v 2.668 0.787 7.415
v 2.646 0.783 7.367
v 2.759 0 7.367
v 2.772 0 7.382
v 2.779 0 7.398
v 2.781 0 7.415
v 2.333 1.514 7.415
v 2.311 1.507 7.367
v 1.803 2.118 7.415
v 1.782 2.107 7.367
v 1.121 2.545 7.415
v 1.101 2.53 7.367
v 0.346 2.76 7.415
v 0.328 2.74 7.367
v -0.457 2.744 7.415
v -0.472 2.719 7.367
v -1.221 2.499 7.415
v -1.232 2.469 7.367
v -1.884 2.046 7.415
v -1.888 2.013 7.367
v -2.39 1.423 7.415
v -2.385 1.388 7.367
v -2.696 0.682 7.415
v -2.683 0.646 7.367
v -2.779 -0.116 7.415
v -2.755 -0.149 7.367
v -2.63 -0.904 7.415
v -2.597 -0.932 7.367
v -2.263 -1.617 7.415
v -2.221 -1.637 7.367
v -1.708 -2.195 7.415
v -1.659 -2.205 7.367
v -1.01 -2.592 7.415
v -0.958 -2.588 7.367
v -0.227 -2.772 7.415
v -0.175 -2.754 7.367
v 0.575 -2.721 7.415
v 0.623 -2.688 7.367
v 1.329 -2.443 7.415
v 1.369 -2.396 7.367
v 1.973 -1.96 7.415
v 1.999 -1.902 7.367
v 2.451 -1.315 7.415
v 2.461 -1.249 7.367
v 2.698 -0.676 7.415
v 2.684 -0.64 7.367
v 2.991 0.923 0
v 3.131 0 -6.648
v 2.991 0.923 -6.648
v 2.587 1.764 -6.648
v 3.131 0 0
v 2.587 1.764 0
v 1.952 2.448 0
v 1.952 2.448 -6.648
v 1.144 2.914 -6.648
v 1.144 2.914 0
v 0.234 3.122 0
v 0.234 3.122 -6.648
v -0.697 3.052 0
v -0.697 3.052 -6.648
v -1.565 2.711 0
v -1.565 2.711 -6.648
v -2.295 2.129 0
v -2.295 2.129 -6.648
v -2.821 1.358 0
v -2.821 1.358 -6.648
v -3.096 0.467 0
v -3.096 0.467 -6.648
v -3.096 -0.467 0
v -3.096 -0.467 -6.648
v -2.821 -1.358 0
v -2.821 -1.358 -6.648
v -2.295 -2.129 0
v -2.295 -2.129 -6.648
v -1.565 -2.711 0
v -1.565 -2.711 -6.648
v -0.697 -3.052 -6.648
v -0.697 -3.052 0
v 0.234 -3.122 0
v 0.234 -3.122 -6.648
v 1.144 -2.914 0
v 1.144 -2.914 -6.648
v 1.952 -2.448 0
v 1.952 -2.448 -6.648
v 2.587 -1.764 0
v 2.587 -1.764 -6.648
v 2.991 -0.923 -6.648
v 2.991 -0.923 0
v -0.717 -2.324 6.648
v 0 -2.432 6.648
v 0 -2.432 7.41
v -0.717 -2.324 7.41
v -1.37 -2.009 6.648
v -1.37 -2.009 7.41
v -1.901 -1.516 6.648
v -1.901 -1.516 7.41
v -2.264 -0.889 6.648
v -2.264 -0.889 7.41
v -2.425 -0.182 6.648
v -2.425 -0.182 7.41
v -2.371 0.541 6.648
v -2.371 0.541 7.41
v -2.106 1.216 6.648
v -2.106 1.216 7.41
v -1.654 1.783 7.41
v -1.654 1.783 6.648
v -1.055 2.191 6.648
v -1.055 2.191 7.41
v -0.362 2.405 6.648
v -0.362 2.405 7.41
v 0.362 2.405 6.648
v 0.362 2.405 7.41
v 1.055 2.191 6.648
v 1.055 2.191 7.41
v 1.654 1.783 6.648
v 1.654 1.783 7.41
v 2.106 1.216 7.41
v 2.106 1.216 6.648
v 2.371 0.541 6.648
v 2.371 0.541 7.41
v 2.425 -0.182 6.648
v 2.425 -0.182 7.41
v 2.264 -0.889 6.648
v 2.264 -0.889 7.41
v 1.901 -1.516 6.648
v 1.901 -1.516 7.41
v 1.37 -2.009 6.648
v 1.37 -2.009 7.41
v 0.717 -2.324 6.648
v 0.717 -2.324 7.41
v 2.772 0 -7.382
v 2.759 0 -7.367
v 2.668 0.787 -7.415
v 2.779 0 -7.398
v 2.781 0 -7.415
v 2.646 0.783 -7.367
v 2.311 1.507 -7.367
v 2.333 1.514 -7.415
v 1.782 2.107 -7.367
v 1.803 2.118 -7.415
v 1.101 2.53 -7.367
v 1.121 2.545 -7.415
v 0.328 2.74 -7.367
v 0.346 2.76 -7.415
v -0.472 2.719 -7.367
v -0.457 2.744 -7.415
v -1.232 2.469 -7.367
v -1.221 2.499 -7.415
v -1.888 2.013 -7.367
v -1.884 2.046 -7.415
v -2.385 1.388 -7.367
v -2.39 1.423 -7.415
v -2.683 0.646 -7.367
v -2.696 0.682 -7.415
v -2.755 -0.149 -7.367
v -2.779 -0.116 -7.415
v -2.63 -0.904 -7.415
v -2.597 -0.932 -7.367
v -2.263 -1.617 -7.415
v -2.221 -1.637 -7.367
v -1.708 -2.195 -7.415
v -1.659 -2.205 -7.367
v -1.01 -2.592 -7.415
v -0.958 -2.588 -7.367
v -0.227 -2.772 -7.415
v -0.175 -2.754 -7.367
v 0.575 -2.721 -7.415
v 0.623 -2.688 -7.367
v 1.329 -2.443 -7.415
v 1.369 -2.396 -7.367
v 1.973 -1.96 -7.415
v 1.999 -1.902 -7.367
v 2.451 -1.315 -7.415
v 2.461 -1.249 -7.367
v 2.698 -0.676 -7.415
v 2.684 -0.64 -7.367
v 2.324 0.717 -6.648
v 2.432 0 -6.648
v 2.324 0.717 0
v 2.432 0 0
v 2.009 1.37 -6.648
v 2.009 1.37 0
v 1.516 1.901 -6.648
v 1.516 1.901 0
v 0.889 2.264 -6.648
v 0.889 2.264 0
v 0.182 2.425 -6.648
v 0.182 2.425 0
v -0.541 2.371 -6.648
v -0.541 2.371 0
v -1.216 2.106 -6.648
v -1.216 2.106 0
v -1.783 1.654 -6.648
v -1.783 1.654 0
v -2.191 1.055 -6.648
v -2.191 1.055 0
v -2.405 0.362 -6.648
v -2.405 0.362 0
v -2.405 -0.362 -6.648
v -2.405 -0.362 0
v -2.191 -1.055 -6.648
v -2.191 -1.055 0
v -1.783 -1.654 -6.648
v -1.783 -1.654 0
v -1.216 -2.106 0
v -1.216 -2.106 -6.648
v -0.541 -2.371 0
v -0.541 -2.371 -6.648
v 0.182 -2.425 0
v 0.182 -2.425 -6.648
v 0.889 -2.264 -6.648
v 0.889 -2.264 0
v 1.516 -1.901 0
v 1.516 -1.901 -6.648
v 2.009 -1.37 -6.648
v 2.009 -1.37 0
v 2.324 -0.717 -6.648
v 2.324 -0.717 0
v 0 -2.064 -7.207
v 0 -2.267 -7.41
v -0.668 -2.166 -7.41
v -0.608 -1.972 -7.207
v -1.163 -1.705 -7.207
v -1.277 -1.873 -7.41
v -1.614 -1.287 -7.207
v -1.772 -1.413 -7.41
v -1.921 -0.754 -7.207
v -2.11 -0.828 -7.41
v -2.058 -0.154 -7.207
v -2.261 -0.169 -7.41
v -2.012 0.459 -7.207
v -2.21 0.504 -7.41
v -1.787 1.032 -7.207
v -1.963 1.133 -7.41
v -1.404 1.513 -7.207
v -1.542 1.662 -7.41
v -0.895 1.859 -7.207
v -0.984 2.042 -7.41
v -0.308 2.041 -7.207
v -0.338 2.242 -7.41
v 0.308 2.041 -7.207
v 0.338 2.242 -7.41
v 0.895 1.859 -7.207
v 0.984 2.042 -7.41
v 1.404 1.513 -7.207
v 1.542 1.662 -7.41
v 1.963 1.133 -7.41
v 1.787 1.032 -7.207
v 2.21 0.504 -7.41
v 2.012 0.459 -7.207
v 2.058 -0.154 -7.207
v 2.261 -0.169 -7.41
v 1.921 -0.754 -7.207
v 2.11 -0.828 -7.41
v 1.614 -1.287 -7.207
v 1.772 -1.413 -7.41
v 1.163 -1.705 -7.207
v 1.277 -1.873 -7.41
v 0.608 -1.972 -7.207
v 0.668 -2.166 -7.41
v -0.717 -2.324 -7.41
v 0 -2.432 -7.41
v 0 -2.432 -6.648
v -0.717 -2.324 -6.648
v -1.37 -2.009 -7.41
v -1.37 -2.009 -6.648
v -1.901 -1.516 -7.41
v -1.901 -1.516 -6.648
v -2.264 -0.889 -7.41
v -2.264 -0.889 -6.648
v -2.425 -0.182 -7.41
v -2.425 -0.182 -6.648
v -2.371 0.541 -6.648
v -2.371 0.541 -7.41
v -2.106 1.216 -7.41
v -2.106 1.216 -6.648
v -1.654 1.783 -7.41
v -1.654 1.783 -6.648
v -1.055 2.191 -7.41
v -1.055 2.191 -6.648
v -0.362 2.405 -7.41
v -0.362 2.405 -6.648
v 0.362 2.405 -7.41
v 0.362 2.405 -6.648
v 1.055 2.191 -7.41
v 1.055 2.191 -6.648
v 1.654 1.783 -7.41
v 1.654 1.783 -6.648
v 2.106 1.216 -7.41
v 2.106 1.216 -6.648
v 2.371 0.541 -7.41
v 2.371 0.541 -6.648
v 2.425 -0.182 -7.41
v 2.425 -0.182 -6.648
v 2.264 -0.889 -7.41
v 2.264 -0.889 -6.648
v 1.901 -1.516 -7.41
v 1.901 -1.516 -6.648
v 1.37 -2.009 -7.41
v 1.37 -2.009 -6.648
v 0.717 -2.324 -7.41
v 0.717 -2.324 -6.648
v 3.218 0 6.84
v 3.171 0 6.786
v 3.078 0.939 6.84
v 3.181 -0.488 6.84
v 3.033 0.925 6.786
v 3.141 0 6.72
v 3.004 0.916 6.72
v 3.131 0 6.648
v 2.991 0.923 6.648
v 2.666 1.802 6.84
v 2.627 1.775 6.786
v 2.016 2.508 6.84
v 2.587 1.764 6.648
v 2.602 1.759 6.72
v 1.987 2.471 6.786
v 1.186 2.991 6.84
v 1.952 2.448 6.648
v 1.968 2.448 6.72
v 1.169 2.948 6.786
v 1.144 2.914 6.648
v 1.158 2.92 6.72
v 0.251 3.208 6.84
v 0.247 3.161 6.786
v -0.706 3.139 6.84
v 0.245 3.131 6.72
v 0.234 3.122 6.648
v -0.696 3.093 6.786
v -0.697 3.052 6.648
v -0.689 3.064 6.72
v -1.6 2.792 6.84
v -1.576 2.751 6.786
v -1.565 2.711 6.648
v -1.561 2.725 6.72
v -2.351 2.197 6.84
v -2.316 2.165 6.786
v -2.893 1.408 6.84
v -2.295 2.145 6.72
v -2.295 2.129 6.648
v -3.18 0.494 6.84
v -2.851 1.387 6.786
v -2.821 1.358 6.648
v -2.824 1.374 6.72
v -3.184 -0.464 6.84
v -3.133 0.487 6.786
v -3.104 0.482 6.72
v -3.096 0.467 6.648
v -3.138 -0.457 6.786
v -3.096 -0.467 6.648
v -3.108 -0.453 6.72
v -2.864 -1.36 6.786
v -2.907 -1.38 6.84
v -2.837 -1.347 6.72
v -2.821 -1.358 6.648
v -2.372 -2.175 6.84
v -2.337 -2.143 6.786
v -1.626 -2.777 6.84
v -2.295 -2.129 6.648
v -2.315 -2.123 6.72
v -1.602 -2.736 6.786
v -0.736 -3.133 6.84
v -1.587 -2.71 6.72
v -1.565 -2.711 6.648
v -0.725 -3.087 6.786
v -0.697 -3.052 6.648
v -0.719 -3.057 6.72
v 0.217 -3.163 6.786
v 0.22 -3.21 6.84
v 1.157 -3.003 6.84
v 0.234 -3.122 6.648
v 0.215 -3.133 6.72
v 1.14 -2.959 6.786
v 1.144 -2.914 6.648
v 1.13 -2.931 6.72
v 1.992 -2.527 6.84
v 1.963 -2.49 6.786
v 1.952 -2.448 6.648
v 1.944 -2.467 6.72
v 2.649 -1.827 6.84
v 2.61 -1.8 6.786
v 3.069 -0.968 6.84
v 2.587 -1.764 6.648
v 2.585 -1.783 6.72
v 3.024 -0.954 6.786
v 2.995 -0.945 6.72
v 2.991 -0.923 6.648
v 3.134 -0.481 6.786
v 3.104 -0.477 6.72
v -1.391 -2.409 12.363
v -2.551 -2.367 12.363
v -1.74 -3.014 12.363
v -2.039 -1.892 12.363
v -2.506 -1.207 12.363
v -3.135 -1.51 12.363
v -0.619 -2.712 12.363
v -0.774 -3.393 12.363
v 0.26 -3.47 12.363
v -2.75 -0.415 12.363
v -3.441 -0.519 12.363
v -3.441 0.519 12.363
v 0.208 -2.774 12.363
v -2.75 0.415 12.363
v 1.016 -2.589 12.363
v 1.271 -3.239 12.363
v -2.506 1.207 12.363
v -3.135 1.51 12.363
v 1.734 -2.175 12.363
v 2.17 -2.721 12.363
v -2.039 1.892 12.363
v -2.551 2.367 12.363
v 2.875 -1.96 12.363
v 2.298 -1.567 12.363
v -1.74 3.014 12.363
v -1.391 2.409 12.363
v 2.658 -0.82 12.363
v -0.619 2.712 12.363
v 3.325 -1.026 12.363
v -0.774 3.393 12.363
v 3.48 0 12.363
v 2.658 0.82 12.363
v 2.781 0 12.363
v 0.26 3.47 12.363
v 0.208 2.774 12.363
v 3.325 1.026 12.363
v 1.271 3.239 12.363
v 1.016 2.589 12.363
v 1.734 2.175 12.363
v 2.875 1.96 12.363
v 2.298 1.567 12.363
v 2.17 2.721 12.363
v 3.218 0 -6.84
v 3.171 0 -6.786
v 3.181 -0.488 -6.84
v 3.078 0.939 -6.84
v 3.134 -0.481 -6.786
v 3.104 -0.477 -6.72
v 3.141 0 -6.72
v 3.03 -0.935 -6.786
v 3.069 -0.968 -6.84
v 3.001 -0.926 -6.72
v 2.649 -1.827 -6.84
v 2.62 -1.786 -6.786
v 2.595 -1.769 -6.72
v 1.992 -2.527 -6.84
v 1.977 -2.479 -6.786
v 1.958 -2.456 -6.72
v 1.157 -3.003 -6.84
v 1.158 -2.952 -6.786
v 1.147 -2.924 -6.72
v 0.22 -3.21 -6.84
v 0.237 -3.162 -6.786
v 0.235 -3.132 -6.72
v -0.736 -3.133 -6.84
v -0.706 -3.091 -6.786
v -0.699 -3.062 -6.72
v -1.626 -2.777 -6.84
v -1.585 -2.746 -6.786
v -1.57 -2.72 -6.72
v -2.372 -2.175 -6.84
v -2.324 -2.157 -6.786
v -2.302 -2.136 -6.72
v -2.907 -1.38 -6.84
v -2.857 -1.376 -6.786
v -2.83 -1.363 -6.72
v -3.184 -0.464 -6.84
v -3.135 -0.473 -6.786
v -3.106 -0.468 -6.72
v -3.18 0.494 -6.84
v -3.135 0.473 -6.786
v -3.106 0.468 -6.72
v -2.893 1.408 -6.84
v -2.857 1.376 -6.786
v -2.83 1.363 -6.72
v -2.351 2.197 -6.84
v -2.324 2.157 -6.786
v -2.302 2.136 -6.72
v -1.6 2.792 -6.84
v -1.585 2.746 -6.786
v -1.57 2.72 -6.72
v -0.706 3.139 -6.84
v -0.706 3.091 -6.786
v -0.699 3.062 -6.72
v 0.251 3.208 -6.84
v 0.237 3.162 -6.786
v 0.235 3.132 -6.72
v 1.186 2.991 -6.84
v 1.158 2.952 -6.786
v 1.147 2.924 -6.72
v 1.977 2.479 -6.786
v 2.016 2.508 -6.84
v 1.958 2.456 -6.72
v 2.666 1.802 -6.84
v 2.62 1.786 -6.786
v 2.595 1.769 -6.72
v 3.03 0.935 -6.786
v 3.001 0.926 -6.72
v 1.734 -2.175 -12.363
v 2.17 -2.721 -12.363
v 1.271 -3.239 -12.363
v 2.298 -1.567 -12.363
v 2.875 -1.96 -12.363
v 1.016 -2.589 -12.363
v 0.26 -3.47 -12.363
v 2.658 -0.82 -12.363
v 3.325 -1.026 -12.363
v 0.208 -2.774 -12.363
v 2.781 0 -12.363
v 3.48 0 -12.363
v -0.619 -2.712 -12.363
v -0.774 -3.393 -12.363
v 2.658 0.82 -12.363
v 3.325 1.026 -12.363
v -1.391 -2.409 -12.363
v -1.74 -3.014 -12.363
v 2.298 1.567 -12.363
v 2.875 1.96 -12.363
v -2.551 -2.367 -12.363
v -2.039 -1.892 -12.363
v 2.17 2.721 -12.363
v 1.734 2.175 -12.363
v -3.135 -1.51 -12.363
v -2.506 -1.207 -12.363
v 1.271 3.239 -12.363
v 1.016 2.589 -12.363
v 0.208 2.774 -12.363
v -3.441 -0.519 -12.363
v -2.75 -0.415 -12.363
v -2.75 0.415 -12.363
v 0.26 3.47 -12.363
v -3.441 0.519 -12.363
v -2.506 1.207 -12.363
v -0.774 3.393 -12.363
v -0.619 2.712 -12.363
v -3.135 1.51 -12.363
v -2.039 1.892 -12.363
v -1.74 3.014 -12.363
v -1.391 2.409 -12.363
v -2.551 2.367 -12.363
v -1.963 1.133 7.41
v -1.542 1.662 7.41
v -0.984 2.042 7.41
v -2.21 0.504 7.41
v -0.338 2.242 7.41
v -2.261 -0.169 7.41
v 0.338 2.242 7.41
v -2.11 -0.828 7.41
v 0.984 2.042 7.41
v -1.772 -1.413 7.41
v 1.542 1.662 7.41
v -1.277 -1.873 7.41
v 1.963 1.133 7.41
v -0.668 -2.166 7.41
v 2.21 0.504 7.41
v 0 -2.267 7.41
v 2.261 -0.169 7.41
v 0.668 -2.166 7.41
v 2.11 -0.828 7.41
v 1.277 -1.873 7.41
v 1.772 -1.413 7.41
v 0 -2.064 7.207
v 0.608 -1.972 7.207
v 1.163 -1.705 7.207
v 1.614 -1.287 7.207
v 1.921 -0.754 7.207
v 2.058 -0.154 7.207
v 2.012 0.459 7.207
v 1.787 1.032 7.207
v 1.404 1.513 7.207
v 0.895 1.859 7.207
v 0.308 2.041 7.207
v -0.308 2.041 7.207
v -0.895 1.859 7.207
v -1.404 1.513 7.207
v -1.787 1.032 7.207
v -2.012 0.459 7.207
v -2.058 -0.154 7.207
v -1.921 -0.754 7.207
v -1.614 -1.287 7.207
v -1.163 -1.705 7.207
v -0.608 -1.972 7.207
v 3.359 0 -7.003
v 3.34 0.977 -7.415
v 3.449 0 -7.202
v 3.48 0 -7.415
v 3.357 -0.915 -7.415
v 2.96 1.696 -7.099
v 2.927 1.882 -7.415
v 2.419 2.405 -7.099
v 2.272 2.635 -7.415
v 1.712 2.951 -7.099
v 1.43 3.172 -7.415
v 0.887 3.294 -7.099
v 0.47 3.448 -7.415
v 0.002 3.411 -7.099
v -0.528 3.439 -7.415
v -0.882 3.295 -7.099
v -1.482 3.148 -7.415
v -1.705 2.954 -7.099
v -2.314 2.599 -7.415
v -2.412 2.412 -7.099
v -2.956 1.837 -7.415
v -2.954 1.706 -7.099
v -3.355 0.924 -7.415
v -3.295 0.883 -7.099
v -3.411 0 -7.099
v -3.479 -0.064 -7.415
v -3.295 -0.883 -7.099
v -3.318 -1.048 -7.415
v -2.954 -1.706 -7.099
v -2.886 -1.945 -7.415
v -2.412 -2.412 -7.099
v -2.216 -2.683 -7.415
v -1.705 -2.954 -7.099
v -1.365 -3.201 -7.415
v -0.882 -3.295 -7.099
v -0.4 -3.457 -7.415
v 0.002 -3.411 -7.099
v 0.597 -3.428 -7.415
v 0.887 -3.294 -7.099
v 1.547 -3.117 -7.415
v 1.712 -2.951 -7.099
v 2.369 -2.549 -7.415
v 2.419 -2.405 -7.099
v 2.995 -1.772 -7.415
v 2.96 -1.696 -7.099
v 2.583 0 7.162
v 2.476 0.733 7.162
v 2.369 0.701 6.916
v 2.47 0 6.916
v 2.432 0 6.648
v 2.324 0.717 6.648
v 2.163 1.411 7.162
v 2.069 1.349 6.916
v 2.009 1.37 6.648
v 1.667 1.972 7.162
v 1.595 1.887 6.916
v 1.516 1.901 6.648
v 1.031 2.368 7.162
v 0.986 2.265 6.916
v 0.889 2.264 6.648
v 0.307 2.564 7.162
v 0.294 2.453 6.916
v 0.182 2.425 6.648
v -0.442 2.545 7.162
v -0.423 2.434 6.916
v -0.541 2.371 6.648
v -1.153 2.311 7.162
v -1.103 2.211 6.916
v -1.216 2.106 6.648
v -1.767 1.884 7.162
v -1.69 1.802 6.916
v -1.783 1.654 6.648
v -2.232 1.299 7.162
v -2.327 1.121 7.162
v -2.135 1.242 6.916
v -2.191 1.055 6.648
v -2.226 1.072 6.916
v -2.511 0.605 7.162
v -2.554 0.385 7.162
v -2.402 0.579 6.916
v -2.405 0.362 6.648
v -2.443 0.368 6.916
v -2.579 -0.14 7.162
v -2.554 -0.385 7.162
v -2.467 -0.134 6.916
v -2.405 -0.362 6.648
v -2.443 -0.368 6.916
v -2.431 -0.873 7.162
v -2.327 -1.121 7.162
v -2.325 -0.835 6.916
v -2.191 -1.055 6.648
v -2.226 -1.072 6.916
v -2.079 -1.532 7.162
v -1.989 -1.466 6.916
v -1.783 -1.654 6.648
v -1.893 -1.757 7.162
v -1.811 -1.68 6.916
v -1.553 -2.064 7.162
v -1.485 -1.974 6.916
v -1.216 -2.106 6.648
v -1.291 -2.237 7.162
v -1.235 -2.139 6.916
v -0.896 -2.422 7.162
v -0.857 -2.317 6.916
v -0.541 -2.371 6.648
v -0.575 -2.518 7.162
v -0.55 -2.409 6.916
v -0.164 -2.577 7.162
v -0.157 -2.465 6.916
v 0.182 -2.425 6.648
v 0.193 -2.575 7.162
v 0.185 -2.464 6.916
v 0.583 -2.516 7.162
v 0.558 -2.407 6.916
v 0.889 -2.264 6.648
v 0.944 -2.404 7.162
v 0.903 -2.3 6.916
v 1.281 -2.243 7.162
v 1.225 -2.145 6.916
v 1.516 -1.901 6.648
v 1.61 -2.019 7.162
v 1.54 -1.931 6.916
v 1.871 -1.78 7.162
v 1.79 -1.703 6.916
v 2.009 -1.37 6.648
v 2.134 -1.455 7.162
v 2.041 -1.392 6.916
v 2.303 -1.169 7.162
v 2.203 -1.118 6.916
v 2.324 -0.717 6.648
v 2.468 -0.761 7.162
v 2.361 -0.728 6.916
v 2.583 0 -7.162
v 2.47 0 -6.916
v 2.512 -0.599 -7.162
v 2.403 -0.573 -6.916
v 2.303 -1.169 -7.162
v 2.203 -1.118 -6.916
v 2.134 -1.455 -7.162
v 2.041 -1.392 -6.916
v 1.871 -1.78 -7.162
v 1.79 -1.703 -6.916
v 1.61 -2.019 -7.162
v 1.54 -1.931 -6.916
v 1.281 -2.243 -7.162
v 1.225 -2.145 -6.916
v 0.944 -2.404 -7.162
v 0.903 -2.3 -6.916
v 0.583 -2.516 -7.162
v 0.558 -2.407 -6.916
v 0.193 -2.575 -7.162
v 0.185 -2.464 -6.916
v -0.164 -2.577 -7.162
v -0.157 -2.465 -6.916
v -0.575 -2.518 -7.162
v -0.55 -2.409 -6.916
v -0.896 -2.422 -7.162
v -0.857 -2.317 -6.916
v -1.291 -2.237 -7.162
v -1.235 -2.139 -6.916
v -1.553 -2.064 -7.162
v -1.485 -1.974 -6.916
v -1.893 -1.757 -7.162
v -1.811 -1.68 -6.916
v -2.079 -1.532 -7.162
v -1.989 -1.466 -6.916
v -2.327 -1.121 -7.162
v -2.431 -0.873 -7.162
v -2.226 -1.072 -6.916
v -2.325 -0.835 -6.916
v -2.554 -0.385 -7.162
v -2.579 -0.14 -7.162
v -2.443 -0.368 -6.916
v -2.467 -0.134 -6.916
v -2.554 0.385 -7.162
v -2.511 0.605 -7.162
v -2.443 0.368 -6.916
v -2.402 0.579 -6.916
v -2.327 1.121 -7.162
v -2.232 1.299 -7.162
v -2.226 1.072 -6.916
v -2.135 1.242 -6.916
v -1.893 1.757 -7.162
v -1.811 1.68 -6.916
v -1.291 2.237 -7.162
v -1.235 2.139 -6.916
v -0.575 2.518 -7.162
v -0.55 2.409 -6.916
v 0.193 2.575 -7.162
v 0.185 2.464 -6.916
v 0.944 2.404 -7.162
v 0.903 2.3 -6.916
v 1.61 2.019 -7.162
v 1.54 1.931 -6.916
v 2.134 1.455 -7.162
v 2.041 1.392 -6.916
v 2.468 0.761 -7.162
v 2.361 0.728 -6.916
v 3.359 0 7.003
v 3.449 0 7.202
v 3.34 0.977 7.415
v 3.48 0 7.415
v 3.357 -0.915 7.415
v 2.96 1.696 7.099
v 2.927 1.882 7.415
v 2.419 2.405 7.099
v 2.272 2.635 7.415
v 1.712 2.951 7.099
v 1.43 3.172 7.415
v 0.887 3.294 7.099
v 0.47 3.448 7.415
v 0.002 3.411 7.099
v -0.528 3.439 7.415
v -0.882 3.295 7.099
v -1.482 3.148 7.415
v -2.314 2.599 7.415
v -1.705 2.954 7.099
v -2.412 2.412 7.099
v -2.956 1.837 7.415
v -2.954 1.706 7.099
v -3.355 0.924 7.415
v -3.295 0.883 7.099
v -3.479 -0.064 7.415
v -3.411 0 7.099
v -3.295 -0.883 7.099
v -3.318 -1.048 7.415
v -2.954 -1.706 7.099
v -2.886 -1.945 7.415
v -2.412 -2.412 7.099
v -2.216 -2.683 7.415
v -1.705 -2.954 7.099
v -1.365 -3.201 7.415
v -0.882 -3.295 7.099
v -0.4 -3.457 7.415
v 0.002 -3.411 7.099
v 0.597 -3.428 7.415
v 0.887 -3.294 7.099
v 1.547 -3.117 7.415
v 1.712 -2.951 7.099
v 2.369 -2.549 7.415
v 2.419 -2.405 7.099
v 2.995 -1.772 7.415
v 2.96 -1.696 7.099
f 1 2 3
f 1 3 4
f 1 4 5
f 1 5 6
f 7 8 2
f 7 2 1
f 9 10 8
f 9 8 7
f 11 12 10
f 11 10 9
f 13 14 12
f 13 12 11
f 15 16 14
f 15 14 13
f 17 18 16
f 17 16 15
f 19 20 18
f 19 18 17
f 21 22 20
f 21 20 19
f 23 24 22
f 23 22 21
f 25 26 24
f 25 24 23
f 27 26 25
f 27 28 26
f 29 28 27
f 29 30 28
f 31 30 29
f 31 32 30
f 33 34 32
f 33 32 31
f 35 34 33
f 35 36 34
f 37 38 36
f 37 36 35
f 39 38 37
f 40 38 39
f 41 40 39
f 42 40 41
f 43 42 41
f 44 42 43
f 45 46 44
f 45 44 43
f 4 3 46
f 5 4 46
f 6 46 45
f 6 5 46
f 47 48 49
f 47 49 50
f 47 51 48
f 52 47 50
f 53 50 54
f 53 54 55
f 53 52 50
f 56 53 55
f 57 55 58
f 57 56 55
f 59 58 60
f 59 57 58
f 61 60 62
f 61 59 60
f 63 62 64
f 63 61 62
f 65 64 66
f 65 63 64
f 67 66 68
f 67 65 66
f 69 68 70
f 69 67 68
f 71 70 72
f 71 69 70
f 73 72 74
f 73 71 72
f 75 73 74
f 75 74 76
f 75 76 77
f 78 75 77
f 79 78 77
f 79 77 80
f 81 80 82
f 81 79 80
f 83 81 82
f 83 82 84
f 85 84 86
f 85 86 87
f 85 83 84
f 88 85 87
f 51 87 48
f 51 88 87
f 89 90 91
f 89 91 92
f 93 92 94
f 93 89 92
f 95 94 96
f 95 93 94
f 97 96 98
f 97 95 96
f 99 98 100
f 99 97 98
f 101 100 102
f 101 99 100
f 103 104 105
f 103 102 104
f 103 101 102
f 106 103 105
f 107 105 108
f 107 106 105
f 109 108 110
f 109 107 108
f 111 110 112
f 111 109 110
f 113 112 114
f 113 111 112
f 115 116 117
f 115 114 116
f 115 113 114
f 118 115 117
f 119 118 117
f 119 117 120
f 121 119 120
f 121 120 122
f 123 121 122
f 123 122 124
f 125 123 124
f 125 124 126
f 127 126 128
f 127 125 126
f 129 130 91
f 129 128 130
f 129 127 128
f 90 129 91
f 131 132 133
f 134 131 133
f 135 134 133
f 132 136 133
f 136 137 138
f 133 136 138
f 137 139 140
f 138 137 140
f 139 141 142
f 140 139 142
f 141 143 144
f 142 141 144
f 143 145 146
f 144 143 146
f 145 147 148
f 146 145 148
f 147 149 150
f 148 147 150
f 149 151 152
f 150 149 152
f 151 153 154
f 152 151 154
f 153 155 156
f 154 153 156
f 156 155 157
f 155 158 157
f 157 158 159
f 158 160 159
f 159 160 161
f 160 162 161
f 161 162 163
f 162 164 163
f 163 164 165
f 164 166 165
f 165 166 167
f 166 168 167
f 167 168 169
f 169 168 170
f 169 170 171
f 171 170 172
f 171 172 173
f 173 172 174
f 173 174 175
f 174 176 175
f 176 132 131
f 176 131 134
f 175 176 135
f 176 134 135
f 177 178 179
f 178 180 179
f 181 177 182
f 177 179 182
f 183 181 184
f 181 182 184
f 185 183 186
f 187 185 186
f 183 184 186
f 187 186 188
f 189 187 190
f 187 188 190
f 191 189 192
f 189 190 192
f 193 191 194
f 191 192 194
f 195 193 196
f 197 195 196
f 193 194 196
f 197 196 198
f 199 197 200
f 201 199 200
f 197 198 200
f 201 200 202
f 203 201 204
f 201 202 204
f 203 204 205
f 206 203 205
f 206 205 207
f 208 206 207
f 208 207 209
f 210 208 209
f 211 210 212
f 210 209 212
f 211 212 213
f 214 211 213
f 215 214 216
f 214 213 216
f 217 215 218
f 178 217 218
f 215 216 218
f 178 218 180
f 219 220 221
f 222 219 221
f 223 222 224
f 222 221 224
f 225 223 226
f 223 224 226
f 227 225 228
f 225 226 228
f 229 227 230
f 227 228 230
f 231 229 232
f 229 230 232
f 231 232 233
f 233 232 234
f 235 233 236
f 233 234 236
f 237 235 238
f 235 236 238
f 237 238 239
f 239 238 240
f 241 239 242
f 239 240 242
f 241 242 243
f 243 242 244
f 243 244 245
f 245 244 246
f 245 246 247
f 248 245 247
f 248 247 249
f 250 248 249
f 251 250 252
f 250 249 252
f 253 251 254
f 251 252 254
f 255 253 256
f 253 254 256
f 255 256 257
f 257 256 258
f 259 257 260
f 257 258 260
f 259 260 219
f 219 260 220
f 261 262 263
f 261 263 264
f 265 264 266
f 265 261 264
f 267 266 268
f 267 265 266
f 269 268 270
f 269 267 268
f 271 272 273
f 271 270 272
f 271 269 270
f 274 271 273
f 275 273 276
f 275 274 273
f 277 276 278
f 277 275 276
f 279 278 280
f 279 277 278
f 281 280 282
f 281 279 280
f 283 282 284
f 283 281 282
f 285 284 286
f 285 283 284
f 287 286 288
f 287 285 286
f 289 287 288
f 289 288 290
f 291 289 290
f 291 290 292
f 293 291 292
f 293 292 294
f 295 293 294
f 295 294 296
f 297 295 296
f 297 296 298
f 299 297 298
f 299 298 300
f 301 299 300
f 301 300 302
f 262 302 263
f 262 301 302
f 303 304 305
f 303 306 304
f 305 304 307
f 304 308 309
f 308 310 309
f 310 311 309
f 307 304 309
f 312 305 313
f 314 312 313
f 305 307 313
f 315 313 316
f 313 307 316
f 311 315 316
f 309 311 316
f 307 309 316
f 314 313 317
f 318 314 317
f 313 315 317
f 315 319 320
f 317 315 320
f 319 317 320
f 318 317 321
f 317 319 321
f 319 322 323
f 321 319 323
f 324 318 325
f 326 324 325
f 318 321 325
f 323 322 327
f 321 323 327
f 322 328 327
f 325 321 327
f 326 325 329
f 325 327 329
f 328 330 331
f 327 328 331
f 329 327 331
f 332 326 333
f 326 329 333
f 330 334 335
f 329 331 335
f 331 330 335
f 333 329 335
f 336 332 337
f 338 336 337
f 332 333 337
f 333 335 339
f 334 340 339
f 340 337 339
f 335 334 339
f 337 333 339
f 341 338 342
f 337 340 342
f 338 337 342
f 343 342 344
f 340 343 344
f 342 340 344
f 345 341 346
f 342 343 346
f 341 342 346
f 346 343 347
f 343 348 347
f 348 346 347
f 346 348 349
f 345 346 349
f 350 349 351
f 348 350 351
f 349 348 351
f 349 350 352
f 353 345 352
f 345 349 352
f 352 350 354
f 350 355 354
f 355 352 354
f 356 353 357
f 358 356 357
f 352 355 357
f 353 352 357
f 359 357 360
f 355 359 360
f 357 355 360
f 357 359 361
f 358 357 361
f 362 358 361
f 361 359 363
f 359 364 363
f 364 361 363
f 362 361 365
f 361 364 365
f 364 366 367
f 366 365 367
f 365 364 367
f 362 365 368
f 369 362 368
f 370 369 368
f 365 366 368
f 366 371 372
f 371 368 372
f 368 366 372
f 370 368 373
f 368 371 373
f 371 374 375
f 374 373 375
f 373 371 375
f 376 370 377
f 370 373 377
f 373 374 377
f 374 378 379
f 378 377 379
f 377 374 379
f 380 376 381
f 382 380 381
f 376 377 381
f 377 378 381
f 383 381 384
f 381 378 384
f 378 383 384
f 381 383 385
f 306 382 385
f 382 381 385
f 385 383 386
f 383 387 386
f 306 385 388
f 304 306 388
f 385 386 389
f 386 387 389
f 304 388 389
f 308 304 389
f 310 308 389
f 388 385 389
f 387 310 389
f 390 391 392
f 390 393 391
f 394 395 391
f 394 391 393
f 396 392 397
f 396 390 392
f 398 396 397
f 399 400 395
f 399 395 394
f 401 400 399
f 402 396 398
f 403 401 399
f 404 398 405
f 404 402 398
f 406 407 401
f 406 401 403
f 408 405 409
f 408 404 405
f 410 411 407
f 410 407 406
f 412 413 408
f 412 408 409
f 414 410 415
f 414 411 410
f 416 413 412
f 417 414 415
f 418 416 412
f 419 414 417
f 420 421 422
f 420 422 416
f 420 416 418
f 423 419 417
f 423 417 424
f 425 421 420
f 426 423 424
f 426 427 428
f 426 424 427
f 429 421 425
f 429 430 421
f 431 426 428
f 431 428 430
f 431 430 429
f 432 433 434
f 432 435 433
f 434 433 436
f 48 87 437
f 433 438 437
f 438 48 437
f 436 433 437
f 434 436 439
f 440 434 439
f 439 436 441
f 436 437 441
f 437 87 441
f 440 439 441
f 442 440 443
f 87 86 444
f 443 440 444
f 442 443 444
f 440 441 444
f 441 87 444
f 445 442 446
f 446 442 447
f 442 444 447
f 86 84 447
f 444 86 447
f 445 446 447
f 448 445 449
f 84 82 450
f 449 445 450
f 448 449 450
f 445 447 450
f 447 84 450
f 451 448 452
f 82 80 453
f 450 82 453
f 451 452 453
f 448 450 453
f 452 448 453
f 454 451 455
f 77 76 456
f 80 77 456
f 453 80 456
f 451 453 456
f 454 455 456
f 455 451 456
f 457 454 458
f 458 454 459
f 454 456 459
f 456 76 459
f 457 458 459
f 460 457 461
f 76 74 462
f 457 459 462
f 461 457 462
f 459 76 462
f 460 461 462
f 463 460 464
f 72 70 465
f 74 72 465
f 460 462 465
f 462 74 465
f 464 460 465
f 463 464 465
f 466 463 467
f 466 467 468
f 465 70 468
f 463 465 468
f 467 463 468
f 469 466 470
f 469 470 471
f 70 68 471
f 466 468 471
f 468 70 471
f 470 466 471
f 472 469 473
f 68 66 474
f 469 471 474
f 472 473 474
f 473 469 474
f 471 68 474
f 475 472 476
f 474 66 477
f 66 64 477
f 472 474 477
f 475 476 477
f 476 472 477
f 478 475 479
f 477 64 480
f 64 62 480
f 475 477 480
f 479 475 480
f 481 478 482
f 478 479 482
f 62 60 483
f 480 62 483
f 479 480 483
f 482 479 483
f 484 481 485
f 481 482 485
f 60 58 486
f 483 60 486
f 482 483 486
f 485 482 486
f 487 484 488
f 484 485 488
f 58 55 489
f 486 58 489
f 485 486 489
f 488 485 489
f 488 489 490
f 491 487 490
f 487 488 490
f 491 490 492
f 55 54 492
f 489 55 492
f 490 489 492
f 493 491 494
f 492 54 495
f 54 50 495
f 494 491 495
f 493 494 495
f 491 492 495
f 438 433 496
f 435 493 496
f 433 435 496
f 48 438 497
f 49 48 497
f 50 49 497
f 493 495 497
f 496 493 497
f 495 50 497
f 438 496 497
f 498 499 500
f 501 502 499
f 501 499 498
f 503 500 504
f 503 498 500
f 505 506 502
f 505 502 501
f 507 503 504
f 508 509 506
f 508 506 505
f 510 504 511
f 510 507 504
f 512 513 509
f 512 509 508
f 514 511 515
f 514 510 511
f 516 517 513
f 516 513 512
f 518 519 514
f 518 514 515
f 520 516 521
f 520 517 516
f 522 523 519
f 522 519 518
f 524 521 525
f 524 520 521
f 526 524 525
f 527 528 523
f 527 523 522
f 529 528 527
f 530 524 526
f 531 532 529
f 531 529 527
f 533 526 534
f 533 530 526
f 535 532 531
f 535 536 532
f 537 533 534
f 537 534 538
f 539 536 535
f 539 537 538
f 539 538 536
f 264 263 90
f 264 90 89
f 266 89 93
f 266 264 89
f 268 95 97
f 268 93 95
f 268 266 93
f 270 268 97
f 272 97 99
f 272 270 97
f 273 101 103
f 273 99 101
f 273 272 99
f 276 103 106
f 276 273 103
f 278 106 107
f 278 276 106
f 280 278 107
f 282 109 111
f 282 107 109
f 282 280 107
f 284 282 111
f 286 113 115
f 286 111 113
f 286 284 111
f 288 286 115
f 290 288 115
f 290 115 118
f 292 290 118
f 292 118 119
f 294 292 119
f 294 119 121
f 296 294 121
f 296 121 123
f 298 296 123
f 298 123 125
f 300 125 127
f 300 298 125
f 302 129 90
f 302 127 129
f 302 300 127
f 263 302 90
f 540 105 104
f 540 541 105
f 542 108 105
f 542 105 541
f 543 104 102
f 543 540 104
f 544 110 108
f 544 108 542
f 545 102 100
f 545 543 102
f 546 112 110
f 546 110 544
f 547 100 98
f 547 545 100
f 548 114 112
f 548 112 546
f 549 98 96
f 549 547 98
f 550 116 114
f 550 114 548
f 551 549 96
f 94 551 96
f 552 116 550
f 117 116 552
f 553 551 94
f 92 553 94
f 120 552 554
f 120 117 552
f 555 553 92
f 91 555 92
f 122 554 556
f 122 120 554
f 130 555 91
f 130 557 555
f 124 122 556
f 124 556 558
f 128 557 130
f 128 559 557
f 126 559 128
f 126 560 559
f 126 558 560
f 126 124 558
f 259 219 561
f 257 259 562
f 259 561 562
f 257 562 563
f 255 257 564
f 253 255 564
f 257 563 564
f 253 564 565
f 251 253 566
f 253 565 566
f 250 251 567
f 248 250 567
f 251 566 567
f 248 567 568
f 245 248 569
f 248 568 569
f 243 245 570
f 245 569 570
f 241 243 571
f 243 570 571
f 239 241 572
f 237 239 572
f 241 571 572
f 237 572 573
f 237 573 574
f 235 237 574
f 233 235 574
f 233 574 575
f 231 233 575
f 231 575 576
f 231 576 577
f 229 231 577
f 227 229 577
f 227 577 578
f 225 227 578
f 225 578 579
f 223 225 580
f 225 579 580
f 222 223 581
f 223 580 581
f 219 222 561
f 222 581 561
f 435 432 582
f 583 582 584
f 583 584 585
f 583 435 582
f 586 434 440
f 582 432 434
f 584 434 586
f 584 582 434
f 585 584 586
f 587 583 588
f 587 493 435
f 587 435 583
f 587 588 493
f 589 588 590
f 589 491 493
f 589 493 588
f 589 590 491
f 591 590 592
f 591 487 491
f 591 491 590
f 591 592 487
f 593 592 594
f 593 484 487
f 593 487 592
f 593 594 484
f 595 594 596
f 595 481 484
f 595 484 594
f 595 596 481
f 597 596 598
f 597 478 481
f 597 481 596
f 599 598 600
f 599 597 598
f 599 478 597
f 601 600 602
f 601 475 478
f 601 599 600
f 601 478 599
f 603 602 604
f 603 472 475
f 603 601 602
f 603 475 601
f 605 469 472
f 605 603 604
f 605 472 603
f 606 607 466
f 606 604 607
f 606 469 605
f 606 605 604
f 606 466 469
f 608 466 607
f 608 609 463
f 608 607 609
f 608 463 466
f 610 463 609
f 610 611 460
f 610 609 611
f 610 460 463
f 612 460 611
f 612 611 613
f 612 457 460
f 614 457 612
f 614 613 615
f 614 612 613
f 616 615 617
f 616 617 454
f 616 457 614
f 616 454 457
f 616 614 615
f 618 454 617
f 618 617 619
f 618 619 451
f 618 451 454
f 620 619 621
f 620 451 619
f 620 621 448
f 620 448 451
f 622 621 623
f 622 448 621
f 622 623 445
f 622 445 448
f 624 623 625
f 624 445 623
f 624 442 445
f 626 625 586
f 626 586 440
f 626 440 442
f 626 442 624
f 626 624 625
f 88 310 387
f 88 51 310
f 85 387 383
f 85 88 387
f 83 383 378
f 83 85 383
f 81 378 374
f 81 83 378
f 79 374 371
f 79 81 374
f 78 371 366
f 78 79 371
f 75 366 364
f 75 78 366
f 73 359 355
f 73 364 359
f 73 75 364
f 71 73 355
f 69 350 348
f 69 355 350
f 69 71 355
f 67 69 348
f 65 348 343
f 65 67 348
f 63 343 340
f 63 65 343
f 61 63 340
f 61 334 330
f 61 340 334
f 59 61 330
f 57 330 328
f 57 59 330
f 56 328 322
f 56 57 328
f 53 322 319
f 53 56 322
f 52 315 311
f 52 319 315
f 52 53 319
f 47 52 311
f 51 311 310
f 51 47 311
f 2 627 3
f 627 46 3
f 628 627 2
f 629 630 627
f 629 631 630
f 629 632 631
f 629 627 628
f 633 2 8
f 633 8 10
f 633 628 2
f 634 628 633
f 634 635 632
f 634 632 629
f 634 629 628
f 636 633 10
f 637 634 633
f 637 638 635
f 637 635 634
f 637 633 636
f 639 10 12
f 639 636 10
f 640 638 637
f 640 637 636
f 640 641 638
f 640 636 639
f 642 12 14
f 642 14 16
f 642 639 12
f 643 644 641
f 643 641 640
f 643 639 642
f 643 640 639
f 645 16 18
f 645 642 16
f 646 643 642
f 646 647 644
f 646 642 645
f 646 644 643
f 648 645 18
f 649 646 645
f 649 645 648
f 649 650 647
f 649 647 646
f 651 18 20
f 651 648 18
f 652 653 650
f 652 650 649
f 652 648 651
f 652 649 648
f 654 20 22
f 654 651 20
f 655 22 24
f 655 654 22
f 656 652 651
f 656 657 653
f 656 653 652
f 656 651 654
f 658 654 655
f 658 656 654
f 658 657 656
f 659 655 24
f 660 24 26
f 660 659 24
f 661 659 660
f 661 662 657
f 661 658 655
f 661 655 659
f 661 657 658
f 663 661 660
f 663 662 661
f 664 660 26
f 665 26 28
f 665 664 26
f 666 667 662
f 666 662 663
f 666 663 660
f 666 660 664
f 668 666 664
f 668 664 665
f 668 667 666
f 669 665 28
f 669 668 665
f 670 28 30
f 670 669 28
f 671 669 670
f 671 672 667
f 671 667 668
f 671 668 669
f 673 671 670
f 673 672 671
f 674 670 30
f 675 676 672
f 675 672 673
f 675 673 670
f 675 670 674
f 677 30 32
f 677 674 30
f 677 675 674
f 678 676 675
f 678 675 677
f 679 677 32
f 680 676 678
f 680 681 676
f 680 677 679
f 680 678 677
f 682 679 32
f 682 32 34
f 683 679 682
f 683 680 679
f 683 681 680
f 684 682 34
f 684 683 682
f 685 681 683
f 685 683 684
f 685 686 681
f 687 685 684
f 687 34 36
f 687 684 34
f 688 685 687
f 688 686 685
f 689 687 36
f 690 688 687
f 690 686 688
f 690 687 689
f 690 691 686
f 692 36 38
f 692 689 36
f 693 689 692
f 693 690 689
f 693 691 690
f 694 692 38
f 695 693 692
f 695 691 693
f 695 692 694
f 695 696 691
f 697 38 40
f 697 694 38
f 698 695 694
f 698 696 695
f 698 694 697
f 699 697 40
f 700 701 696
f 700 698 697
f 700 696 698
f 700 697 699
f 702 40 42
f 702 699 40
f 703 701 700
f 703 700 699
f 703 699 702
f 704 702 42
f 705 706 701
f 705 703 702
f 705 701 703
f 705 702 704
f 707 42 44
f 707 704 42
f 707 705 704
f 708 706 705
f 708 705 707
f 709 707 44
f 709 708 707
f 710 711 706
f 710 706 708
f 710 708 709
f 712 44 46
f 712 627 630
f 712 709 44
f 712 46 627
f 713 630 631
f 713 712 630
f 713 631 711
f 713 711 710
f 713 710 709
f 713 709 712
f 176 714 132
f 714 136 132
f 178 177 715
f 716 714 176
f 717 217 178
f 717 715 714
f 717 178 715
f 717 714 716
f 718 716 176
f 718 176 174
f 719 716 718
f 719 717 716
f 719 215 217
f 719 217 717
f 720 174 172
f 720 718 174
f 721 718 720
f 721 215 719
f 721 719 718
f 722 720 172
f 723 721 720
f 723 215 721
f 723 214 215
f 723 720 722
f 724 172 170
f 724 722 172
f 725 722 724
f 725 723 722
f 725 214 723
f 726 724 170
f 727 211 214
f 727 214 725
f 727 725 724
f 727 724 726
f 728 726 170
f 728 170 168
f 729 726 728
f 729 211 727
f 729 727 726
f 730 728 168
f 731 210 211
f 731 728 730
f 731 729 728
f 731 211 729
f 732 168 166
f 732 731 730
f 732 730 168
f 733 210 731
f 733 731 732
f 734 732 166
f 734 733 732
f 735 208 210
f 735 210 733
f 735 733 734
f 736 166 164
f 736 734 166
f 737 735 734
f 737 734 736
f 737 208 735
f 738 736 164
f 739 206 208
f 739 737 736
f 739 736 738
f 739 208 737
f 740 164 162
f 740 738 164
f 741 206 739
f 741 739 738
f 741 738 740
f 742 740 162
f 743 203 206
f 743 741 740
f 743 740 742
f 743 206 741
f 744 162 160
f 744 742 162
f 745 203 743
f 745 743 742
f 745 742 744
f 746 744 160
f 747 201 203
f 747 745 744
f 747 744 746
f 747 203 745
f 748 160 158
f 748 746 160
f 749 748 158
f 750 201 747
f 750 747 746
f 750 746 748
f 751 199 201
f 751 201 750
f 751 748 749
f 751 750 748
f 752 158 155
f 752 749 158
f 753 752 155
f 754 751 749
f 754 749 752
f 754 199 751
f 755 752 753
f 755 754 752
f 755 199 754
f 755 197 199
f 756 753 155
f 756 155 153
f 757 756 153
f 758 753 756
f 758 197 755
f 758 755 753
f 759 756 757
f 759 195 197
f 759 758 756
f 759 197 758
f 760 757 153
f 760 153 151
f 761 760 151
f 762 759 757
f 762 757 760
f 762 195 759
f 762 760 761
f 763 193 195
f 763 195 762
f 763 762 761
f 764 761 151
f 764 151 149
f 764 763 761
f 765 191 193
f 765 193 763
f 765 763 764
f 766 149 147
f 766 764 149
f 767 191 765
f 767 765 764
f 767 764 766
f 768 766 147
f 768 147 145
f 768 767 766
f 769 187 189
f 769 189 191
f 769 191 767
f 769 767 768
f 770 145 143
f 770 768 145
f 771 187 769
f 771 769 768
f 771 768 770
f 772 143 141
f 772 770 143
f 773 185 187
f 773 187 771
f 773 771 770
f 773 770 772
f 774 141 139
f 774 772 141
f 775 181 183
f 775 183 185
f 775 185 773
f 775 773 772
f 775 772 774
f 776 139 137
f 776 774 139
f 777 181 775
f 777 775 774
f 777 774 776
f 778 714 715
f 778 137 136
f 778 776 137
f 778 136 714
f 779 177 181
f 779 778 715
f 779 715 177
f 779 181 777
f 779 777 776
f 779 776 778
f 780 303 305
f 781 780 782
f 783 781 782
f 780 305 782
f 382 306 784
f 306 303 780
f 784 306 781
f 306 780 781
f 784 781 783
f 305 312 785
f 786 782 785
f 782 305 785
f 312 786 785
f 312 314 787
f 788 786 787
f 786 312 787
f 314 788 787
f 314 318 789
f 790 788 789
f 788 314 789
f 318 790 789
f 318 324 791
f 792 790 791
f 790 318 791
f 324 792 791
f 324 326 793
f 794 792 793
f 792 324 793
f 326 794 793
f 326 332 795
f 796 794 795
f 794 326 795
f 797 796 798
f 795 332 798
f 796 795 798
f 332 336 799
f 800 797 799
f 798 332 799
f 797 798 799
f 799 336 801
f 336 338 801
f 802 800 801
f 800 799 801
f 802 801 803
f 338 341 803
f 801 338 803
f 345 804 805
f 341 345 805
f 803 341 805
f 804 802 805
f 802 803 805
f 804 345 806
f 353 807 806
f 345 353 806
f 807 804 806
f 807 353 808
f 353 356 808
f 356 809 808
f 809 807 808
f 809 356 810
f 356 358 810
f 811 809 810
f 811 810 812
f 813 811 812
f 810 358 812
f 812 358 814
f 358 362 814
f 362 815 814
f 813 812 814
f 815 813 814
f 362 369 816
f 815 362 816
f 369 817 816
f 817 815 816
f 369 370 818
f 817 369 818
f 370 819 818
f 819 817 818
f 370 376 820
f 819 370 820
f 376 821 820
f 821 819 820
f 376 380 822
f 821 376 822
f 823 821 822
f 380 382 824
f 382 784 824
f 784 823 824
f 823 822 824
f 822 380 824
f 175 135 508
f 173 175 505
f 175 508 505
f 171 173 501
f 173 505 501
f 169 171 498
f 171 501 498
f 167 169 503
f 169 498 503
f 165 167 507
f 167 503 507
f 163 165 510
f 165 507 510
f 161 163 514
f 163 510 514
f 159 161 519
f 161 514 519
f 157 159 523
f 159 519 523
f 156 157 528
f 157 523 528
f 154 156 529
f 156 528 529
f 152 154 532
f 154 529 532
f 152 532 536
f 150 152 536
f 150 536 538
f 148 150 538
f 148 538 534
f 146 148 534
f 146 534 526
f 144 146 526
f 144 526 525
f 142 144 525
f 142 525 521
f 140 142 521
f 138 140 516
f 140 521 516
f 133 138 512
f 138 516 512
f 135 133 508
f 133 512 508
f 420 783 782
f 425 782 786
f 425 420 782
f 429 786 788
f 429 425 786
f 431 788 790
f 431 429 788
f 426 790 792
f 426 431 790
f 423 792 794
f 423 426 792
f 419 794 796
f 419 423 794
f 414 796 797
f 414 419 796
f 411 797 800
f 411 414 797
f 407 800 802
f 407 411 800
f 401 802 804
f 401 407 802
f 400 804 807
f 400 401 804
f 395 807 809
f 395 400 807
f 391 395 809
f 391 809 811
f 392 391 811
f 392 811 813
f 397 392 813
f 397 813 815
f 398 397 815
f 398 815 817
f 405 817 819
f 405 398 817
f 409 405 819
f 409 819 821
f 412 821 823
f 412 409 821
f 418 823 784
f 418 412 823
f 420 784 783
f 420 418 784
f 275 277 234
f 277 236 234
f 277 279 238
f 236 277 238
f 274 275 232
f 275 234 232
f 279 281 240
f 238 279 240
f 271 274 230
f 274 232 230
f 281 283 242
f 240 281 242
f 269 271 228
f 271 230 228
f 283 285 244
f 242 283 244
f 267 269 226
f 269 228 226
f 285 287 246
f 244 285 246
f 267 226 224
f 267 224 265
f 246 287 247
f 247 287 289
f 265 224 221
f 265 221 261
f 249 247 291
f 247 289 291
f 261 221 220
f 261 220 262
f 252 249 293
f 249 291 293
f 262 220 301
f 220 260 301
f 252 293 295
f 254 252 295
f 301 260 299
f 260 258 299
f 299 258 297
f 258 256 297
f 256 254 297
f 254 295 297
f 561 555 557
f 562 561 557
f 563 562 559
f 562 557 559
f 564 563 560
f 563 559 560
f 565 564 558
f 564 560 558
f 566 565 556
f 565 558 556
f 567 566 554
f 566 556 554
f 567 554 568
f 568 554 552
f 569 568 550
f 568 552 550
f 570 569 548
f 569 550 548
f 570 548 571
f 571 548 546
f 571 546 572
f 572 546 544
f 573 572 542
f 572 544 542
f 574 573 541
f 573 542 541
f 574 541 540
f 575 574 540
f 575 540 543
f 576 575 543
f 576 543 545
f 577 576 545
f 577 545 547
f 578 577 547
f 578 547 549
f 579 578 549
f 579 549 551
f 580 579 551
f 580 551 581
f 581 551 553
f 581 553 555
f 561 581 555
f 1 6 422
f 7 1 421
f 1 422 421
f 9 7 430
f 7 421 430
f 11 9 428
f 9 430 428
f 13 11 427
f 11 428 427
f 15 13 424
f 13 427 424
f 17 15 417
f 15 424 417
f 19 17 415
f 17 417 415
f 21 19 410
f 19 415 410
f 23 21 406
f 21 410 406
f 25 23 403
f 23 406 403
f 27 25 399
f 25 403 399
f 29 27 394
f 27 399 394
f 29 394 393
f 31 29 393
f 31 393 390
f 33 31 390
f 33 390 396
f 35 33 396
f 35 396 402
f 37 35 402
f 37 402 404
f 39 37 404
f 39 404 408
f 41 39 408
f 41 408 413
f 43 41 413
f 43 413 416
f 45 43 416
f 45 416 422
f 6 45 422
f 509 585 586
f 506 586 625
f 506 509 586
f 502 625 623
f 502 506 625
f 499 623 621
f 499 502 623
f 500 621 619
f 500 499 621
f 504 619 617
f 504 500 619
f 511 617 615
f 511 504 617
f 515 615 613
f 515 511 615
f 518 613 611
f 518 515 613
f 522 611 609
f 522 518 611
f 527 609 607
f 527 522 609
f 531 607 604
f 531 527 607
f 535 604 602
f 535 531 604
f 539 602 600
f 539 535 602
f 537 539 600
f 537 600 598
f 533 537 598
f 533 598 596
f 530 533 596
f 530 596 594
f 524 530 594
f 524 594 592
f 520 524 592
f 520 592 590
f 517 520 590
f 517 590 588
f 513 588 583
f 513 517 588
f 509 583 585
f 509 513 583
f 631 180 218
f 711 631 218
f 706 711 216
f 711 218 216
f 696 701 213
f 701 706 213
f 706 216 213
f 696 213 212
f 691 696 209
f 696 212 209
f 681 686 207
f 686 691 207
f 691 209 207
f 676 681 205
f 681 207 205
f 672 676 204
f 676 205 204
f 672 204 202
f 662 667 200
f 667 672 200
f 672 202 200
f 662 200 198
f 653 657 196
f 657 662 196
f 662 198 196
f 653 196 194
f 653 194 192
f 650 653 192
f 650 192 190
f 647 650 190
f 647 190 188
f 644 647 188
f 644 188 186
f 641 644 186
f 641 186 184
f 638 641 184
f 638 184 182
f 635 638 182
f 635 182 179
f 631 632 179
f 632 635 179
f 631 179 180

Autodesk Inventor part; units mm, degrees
ref_plane "YZ Plane" through (0, 0, 0) normal (1, 0, 0) x (0, 1, 0)
ref_plane "XZ Plane" through (0, 0, 0) normal (0, 1, 0) x (-1, 0, 0)
ref_plane "XY Plane" through (0, 0, 0) normal (0, 0, 1) x (1, 0, 0)
sketch "Sketch1" plane through (0, 0, 0) normal (0, 0, 1) x (1, 0, 0)
  circle A0 centre (0, 0) radius 3.13055
  dimension "d0" = 6.2611
extrude "Extrusion1" add sketch "Sketch1" along normal mid plane 24.7269
sketch "Sketch2" plane through (0, 0, 12.36345) normal (0, 0, 1) x (1, 0, 0)
  circle A0 centre (0, 0) radius 3.13055
  circle A1 centre (0, 0) radius 3.4798
  dimension "d3" = 6.9596
extrude "Extrusion2" add sketch "Sketch2" against normal blind 5.461
fillet "Fillet1" radius 0.254 1 edges at (-3.1305, 0, 6.9024)
fillet "Fillet2" radius 0.762 1 edges at (-3.4798, 0, 6.9024)
mirror "Mirror1" about plane through (0, 0, 0) normal (0, 0, 1) of "Extrusion2", "Fillet1", "Fillet2"
shell "Shell1" thickness 0.6985 removed faces 2 at (0.449612, -0.769178, -12.36345) at (0.449612, -0.769178, 12.36345)
sketch "Sketch3" plane through (0, 0, 0) normal (1, 0, 0) x (0, 1, 0)
  line L0 (-3.4798, 7.415066) -> (-3.4798, 12.36345)
  line L1 (-3.4798, 12.36345) -> (-2.7813, 12.36345)
  line L2 (-2.7813, 12.36345) -> (-2.7813, 7.415066)
  line L3 (-2.43205, 6.64845) -> (-2.43205, -6.64845)
  line L4 (-2.7813, -7.415066) -> (-2.7813, -12.36345)
  line L5 (-2.7813, -12.36345) -> (-3.4798, -12.36345)
  line L6 (-3.4798, -12.36345) -> (-3.4798, -7.415066)
  arc A0 (-3.217862, -6.840104) -> (-3.13055, -6.64845) centre (-3.38455, -6.64845) ccw
  line L7 (-3.13055, -6.64845) -> (-3.13055, 6.64845)
  arc A1 (-3.13055, 6.64845) -> (-3.217862, 6.840104) centre (-3.38455, 6.64845) ccw
  arc A2 (3.217862, 6.840104) -> (3.13055, 6.64845) centre (3.38455, 6.64845) ccw
  line L8 (3.13055, 6.64845) -> (3.13055, -6.64845)
  arc A3 (3.13055, -6.64845) -> (3.217862, -6.840104) centre (3.38455, -6.64845) ccw
  line L9 (3.4798, -7.415066) -> (3.4798, -12.36345)
  line L10 (3.4798, -12.36345) -> (2.7813, -12.36345)
  line L11 (2.7813, -12.36345) -> (2.7813, -7.415066)
  line L12 (2.43205, -6.64845) -> (2.43205, 6.64845)
  line L13 (2.7813, 7.415066) -> (2.7813, 12.36345)
  line L14 (2.7813, 12.36345) -> (3.4798, 12.36345)
  line L15 (3.4798, 12.36345) -> (3.4798, 7.415066)
  line L16 (-2.43205, -7.41045) -> (-2.06375, -7.41045)
  line L17 (-2.06375, -7.41045) -> (-2.06375, 7.41045)
  line L18 (-2.06375, 7.41045) -> (-2.43205, 7.41045)
  line L19 (-2.43205, 7.41045) -> (-2.43205, -7.41045)
  line L20 (0, -17.30883) -> (0, 17.30883)
  arc A4 (-3.4798, 7.415066) -> (-3.217862, 6.840104) centre (-2.7178, 7.415066) ccw
  arc A5 (-2.7813, 7.415066) -> (-2.759472, 7.367153) centre (-2.7178, 7.415066) ccw
  arc A6 (-2.43205, 6.64845) -> (-2.759472, 7.367153) centre (-3.38455, 6.64845) ccw
  arc A7 (-2.759472, -7.367153) -> (-2.43205, -6.64845) centre (-3.38455, -6.64845) ccw
  arc A8 (-2.759472, -7.367153) -> (-2.7813, -7.415066) centre (-2.7178, -7.415066) ccw
  arc A9 (-3.217862, -6.840104) -> (-3.4798, -7.415066) centre (-2.7178, -7.415066) ccw
  arc A10 (3.217862, 6.840104) -> (3.4798, 7.415066) centre (2.7178, 7.415066) ccw
  arc A11 (3.4798, -7.415066) -> (3.217862, -6.840104) centre (2.7178, -7.415066) ccw
  arc A12 (2.7813, -7.415066) -> (2.759472, -7.367153) centre (2.7178, -7.415066) ccw
  arc A13 (2.43205, -6.64845) -> (2.759472, -7.367153) centre (3.38455, -6.64845) ccw
  arc A14 (2.759472, 7.367153) -> (2.43205, 6.64845) centre (3.38455, 6.64845) ccw
  arc A15 (2.759472, 7.367153) -> (2.7813, 7.415066) centre (2.7178, 7.415066) ccw
  point P0 (0, 0)
  dimension "d9" = 0.3683
  dimension "d10" = 0.762
  dimension "d11" = 0.762
revolve "Revolution1" add sketch "Sketch3" angle 360 about axis through (0, 0, -10) along (0, 0, 1) separate body contours L19 L18 L17 L16 L3
chamfer "Chamfer1" distance 0.2032 angle 45 2 edges at (0, 2.0638, 7.4105) (0, 2.0637, -7.4105)
properties part number "12-10 double sided female tube yellow"
